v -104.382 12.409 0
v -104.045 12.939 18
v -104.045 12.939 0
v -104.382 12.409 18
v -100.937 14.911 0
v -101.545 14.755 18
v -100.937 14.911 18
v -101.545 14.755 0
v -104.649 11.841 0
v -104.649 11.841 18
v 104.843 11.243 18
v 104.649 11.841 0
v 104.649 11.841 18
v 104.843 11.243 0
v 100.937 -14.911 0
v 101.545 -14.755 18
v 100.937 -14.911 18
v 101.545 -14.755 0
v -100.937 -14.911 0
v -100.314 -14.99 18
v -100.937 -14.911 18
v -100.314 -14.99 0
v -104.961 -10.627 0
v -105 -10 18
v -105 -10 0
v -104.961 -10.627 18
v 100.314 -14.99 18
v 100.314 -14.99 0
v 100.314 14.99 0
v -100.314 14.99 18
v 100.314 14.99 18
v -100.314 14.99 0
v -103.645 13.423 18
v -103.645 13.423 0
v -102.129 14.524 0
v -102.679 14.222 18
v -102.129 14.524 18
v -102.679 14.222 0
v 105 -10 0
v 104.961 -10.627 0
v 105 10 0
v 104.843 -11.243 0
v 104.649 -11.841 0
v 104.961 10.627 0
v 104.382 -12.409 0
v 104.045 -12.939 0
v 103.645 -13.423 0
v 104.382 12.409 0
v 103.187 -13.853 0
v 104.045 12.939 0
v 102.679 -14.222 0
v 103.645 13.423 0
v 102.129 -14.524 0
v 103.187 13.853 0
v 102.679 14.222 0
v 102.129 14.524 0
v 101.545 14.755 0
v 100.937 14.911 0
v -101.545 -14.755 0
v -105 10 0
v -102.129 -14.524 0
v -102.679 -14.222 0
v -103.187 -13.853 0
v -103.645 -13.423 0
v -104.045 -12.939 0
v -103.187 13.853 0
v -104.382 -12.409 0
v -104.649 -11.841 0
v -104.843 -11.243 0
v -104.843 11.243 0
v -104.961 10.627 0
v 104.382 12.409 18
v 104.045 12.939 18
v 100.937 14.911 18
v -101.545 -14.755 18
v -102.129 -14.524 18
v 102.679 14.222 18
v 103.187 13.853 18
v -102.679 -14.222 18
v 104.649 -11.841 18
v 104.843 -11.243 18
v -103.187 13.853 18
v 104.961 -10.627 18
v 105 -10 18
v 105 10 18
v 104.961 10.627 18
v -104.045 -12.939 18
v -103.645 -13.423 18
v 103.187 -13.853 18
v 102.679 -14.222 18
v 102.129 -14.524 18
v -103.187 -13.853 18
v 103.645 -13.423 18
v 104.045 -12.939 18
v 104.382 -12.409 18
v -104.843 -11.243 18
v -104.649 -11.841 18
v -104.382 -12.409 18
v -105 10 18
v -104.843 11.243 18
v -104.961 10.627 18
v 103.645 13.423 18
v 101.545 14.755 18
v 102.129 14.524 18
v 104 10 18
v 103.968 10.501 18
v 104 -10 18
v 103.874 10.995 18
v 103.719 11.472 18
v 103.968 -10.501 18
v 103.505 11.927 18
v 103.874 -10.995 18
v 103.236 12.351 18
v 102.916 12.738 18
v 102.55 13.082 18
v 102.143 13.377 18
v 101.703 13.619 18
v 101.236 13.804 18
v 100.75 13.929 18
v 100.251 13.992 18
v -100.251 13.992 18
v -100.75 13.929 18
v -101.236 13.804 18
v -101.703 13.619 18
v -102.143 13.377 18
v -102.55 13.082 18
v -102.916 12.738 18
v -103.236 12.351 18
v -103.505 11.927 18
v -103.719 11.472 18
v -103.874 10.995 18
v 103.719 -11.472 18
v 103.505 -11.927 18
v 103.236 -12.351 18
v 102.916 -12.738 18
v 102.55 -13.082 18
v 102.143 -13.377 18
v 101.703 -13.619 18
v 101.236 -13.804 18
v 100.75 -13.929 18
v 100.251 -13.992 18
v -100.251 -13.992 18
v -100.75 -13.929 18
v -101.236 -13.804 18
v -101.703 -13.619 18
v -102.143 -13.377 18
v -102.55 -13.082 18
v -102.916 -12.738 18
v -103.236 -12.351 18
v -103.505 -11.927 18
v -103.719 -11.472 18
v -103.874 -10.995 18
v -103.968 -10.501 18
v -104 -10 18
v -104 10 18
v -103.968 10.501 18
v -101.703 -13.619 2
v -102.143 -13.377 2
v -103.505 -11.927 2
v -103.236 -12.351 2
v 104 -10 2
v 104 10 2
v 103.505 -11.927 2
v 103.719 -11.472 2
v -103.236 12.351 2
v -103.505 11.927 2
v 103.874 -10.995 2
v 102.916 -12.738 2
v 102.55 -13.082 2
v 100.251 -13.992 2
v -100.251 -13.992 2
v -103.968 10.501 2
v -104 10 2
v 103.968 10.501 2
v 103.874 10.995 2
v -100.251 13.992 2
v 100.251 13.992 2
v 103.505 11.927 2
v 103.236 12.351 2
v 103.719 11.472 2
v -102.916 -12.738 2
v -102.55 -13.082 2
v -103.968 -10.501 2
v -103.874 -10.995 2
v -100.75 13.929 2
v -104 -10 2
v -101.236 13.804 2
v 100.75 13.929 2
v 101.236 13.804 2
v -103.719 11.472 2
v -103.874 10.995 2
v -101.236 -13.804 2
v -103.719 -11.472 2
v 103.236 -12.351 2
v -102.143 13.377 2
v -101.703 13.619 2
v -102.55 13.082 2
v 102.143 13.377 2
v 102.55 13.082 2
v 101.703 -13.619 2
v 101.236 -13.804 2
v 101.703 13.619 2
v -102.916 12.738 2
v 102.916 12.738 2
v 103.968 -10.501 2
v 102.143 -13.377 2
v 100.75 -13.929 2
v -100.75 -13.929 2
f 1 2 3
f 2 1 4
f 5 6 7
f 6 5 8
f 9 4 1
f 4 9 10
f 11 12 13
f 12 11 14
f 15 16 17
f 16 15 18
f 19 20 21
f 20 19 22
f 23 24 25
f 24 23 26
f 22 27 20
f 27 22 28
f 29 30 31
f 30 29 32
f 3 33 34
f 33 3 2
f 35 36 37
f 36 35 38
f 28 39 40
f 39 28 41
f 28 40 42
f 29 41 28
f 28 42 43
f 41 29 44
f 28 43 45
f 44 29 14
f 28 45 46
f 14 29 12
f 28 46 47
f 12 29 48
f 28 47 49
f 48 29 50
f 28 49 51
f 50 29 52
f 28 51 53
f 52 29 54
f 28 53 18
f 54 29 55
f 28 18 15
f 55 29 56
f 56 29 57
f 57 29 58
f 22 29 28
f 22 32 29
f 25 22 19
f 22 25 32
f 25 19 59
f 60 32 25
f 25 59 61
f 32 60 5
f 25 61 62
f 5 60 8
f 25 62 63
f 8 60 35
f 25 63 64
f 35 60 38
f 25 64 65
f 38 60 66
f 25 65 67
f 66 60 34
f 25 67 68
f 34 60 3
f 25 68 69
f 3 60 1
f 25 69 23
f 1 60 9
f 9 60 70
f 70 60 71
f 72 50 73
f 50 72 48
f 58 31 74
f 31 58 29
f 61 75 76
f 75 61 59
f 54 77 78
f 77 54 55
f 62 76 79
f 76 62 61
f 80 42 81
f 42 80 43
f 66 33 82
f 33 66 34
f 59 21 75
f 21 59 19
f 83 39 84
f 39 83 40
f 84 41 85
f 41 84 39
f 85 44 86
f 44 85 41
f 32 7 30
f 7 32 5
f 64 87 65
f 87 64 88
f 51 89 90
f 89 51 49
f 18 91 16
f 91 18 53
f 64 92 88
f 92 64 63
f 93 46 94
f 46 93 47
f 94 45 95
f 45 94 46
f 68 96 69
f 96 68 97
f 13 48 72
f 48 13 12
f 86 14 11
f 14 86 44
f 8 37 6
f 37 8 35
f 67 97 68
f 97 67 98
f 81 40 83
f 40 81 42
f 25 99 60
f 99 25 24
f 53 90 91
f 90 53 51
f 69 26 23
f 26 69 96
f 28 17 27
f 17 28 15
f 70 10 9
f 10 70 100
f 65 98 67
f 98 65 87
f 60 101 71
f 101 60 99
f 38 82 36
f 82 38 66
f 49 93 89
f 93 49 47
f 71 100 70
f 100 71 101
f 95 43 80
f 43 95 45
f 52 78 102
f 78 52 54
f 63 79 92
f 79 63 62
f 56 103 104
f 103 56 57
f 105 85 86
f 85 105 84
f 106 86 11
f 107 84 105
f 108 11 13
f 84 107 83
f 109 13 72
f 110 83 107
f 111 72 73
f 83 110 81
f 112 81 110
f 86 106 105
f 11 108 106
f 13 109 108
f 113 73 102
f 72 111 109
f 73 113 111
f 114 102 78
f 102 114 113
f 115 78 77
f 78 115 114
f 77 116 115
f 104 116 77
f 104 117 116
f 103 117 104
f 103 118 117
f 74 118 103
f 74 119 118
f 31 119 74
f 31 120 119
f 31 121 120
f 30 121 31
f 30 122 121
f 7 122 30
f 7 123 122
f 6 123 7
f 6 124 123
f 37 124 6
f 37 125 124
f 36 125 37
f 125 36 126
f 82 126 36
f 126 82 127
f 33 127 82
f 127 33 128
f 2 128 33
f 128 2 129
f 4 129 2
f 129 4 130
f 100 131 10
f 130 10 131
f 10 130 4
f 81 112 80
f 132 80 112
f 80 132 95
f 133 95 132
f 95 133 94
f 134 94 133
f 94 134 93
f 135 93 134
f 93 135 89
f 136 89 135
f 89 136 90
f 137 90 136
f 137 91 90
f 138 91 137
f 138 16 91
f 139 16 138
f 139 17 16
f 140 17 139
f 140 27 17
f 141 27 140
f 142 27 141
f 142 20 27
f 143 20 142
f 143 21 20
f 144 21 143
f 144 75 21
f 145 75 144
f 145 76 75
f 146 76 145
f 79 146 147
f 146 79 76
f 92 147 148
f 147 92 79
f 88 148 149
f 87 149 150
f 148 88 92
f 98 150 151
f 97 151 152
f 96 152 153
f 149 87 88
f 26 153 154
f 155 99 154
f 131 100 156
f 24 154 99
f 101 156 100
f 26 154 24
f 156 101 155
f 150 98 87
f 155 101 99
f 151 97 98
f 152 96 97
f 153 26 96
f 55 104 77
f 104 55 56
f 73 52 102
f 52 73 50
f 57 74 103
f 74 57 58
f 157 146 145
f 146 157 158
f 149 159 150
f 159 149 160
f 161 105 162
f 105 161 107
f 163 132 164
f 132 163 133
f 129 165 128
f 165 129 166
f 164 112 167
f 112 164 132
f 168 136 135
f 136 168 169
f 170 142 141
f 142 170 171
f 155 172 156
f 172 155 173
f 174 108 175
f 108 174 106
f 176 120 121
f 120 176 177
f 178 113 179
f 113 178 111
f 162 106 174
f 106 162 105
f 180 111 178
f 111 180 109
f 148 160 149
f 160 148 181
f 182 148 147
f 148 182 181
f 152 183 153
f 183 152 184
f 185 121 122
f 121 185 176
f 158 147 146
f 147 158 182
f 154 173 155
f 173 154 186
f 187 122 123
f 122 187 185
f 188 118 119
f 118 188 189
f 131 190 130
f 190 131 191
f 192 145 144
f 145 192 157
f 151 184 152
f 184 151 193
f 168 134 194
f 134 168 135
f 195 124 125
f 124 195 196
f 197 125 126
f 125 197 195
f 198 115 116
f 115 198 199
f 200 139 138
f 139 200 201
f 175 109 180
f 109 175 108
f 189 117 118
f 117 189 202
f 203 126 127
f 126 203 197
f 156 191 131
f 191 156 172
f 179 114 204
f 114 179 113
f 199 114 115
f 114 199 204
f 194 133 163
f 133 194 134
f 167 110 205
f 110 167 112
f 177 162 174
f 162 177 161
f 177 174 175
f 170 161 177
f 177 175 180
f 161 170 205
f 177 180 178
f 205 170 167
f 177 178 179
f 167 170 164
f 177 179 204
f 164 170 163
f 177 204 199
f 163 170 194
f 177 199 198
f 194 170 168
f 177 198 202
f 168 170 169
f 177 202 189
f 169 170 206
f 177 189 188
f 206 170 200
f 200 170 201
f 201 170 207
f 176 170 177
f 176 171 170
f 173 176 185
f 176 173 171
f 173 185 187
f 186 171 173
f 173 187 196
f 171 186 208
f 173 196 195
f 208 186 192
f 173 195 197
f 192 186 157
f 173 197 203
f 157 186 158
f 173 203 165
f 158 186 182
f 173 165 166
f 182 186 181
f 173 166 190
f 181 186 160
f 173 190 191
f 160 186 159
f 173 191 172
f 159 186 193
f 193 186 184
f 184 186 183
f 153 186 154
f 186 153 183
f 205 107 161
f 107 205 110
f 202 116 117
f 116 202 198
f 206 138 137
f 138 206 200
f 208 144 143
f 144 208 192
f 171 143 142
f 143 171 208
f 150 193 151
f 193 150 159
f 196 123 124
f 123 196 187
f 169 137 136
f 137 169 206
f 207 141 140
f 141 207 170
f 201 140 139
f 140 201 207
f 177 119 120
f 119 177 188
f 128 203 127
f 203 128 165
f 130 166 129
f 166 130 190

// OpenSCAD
$fn = 50;


difference() {
	union() {
		hull() {
			translate(v = [-100.0000000000, 10.0000000000, 0]) {
				cylinder(h = 18, r = 5);
			}
			translate(v = [100.0000000000, 10.0000000000, 0]) {
				cylinder(h = 18, r = 5);
			}
			translate(v = [-100.0000000000, -10.0000000000, 0]) {
				cylinder(h = 18, r = 5);
			}
			translate(v = [100.0000000000, -10.0000000000, 0]) {
				cylinder(h = 18, r = 5);
			}
		}
	}
	union() {
		translate(v = [0, 0, 2]) {
			hull() {
				translate(v = [-100.0000000000, 10.0000000000, 0]) {
					cylinder(h = 16, r = 4);
				}
				translate(v = [100.0000000000, 10.0000000000, 0]) {
					cylinder(h = 16, r = 4);
				}
				translate(v = [-100.0000000000, -10.0000000000, 0]) {
					cylinder(h = 16, r = 4);
				}
				translate(v = [100.0000000000, -10.0000000000, 0]) {
					cylinder(h = 16, r = 4);
				}
			}
		}
	}
}
